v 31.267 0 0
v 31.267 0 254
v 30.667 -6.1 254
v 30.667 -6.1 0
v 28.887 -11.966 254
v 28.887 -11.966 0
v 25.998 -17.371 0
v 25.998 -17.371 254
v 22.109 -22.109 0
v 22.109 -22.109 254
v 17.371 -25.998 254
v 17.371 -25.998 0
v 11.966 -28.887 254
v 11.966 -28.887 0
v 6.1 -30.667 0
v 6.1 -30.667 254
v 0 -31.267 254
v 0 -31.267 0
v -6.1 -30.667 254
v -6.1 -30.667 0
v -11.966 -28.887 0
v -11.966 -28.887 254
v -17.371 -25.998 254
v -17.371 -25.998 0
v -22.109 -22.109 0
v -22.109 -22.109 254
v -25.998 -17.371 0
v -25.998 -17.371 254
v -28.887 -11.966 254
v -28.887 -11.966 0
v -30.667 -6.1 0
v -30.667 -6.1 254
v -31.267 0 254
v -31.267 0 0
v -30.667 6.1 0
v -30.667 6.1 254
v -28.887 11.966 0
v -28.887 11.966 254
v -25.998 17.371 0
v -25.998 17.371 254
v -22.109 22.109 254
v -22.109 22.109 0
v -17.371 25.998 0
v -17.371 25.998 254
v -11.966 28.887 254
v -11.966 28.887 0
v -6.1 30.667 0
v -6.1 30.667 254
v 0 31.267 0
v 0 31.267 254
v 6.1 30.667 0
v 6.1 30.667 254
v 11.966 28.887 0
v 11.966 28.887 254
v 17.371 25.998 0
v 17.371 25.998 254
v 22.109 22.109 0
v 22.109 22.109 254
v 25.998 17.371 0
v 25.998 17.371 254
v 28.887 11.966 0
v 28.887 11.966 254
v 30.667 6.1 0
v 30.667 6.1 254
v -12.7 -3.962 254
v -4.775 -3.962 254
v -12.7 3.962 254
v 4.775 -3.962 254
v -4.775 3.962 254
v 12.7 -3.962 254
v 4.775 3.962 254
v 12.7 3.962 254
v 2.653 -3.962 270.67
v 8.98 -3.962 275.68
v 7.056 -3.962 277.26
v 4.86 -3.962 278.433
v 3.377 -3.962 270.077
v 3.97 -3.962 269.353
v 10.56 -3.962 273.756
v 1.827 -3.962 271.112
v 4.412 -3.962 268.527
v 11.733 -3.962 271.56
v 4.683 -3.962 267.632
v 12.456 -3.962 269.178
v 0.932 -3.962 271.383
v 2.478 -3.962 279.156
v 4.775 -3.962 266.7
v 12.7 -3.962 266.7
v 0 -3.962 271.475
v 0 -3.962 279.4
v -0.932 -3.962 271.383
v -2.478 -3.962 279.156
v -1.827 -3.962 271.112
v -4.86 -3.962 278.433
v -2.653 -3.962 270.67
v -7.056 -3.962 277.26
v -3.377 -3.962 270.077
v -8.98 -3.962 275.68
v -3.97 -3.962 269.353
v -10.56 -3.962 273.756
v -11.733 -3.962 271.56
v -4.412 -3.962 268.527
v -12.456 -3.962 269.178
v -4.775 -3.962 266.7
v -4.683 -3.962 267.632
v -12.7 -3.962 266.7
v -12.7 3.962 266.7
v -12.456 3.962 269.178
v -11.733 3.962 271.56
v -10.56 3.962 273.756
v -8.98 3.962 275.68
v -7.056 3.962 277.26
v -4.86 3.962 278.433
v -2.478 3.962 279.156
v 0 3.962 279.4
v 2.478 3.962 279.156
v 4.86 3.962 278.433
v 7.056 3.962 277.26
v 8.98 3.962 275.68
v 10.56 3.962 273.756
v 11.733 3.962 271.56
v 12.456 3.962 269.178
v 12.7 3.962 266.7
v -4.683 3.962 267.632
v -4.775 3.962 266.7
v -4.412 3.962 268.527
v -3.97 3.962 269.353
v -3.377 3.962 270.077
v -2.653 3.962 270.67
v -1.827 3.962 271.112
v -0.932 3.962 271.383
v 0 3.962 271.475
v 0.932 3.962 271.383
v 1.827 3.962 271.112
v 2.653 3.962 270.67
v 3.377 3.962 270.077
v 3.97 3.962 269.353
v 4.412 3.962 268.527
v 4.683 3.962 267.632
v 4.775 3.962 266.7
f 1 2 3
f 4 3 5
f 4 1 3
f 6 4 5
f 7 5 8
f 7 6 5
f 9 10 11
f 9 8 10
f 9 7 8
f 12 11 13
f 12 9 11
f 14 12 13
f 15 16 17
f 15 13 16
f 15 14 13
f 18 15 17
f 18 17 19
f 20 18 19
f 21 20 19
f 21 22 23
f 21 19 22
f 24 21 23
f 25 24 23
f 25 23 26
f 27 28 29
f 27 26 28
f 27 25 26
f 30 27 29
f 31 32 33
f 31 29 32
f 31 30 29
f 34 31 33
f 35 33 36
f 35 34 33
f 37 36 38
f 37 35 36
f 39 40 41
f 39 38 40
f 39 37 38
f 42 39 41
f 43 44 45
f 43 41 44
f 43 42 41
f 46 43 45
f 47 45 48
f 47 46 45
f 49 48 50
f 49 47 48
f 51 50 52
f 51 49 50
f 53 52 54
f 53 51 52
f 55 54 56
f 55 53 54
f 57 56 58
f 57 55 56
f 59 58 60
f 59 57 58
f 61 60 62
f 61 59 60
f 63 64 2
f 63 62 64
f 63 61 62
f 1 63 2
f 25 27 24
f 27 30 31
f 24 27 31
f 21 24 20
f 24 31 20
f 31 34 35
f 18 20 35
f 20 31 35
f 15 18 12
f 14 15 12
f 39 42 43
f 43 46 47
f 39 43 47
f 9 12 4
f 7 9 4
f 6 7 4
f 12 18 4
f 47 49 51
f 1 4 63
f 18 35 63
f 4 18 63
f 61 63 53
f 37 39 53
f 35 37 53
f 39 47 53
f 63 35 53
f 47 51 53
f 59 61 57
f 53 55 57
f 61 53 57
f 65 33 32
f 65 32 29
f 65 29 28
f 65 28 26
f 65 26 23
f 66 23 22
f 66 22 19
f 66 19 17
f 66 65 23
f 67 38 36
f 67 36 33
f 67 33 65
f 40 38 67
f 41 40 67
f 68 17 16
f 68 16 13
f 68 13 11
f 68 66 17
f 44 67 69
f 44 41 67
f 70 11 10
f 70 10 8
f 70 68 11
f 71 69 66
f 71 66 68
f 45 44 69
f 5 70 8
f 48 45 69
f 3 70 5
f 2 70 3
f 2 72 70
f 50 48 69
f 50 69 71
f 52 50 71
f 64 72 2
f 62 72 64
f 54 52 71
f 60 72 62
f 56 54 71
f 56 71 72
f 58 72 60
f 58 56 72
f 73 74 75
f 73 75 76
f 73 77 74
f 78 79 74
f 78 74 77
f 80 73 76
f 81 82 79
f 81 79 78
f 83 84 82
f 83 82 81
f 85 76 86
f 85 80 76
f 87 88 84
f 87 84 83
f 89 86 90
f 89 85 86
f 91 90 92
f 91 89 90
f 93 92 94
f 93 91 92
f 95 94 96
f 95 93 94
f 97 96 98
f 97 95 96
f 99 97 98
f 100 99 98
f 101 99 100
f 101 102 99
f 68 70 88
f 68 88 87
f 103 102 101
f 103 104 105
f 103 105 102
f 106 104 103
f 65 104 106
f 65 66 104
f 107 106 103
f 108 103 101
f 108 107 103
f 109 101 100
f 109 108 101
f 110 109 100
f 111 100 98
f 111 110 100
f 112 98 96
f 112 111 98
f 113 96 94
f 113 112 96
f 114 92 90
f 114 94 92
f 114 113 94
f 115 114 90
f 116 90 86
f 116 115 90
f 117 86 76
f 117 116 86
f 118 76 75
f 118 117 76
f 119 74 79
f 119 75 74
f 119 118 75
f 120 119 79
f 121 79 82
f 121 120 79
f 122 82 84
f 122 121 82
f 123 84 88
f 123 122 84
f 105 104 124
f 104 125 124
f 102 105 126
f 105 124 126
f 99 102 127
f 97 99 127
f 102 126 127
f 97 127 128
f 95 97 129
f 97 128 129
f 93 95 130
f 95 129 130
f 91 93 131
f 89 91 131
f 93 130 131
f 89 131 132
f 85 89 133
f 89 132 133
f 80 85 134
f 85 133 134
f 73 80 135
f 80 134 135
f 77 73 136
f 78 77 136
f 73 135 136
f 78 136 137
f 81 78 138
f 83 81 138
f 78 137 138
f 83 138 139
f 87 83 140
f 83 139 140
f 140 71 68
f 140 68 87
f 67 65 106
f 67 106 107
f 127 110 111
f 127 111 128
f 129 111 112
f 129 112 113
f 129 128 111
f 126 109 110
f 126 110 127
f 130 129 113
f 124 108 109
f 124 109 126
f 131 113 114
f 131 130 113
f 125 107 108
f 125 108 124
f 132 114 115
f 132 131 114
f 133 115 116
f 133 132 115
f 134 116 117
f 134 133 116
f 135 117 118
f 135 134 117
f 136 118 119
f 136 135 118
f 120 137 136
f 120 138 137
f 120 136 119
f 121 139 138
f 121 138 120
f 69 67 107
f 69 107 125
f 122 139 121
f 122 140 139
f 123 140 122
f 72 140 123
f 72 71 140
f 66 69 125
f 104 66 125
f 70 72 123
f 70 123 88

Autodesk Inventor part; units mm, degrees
ref_plane "YZ Plane" through (0, 0, 0) normal (1, 0, 0) x (0, 1, 0)
ref_plane "XZ Plane" through (0, 0, 0) normal (0, 1, 0) x (-1, 0, 0)
ref_plane "XY Plane" through (0, 0, 0) normal (0, 0, 1) x (1, 0, 0)
sketch "Sketch1" plane through (0, 0, 0) normal (0, 0, 1) x (1, 0, 0)
  circle A0 centre (0, 0) radius 31.2674
  dimension "d0" = 62.5348
extrude "Extrusion1" add sketch "Sketch1" along normal blind 254
sketch "Sketch2" plane through (0, 0, 254) normal (0, 0, 1) x (1, 0, 0)
  circle A0 centre (0, 0) radius 31.2674 projected
  line L0 (-12.7, 3.9624) -> (12.7, 3.9624)
  line L1 (12.7, 3.9624) -> (12.7, -3.9624)
  line L2 (12.7, -3.9624) -> (-12.7, -3.9624)
  line L3 (-12.7, -3.9624) -> (-12.7, 3.9624)
  dimension "d3" = 7.9248
  dimension "d4" = 3.9624
  dimension "d5" = 12.7
  dimension "d6" = 12.7
extrude "Extrusion2" add sketch "Sketch2" along normal blind 25.4 contours L0 L1 L2 L3
sketch "Sketch3" plane through (-12.7, 3.9624, 254) normal (0, 1, 0) x (1, 0, 0)
  line L0 (0, 0) -> (25.4, 0) projected
  line L1 (0, 0) -> (0, -25.4) projected
  line L2 (25.4, -25.4) -> (0, -25.4) projected
  line L3 (25.4, 0) -> (25.4, -25.4) projected
  arc A0 (0, -12.7) -> (25.4, -12.7) centre (12.7, -12.7) ccw
  line L4 (7.9248, 0) -> (7.9248, -12.7)
  line L5 (17.4752, 0) -> (17.4752, -12.7)
  arc A1 (7.9248, -12.7) -> (17.4752, -12.7) centre (12.7, -12.7) ccw
  point P0 (12.7, 254)
  dimension "d9" = 7.9248
extrude "Extrusion3" cut sketch "Sketch3" against normal blind 25.4 contours L0 L5 A1 L4 | A0 L2 L1 | A0 L3 L2
properties part number "Spring End"
